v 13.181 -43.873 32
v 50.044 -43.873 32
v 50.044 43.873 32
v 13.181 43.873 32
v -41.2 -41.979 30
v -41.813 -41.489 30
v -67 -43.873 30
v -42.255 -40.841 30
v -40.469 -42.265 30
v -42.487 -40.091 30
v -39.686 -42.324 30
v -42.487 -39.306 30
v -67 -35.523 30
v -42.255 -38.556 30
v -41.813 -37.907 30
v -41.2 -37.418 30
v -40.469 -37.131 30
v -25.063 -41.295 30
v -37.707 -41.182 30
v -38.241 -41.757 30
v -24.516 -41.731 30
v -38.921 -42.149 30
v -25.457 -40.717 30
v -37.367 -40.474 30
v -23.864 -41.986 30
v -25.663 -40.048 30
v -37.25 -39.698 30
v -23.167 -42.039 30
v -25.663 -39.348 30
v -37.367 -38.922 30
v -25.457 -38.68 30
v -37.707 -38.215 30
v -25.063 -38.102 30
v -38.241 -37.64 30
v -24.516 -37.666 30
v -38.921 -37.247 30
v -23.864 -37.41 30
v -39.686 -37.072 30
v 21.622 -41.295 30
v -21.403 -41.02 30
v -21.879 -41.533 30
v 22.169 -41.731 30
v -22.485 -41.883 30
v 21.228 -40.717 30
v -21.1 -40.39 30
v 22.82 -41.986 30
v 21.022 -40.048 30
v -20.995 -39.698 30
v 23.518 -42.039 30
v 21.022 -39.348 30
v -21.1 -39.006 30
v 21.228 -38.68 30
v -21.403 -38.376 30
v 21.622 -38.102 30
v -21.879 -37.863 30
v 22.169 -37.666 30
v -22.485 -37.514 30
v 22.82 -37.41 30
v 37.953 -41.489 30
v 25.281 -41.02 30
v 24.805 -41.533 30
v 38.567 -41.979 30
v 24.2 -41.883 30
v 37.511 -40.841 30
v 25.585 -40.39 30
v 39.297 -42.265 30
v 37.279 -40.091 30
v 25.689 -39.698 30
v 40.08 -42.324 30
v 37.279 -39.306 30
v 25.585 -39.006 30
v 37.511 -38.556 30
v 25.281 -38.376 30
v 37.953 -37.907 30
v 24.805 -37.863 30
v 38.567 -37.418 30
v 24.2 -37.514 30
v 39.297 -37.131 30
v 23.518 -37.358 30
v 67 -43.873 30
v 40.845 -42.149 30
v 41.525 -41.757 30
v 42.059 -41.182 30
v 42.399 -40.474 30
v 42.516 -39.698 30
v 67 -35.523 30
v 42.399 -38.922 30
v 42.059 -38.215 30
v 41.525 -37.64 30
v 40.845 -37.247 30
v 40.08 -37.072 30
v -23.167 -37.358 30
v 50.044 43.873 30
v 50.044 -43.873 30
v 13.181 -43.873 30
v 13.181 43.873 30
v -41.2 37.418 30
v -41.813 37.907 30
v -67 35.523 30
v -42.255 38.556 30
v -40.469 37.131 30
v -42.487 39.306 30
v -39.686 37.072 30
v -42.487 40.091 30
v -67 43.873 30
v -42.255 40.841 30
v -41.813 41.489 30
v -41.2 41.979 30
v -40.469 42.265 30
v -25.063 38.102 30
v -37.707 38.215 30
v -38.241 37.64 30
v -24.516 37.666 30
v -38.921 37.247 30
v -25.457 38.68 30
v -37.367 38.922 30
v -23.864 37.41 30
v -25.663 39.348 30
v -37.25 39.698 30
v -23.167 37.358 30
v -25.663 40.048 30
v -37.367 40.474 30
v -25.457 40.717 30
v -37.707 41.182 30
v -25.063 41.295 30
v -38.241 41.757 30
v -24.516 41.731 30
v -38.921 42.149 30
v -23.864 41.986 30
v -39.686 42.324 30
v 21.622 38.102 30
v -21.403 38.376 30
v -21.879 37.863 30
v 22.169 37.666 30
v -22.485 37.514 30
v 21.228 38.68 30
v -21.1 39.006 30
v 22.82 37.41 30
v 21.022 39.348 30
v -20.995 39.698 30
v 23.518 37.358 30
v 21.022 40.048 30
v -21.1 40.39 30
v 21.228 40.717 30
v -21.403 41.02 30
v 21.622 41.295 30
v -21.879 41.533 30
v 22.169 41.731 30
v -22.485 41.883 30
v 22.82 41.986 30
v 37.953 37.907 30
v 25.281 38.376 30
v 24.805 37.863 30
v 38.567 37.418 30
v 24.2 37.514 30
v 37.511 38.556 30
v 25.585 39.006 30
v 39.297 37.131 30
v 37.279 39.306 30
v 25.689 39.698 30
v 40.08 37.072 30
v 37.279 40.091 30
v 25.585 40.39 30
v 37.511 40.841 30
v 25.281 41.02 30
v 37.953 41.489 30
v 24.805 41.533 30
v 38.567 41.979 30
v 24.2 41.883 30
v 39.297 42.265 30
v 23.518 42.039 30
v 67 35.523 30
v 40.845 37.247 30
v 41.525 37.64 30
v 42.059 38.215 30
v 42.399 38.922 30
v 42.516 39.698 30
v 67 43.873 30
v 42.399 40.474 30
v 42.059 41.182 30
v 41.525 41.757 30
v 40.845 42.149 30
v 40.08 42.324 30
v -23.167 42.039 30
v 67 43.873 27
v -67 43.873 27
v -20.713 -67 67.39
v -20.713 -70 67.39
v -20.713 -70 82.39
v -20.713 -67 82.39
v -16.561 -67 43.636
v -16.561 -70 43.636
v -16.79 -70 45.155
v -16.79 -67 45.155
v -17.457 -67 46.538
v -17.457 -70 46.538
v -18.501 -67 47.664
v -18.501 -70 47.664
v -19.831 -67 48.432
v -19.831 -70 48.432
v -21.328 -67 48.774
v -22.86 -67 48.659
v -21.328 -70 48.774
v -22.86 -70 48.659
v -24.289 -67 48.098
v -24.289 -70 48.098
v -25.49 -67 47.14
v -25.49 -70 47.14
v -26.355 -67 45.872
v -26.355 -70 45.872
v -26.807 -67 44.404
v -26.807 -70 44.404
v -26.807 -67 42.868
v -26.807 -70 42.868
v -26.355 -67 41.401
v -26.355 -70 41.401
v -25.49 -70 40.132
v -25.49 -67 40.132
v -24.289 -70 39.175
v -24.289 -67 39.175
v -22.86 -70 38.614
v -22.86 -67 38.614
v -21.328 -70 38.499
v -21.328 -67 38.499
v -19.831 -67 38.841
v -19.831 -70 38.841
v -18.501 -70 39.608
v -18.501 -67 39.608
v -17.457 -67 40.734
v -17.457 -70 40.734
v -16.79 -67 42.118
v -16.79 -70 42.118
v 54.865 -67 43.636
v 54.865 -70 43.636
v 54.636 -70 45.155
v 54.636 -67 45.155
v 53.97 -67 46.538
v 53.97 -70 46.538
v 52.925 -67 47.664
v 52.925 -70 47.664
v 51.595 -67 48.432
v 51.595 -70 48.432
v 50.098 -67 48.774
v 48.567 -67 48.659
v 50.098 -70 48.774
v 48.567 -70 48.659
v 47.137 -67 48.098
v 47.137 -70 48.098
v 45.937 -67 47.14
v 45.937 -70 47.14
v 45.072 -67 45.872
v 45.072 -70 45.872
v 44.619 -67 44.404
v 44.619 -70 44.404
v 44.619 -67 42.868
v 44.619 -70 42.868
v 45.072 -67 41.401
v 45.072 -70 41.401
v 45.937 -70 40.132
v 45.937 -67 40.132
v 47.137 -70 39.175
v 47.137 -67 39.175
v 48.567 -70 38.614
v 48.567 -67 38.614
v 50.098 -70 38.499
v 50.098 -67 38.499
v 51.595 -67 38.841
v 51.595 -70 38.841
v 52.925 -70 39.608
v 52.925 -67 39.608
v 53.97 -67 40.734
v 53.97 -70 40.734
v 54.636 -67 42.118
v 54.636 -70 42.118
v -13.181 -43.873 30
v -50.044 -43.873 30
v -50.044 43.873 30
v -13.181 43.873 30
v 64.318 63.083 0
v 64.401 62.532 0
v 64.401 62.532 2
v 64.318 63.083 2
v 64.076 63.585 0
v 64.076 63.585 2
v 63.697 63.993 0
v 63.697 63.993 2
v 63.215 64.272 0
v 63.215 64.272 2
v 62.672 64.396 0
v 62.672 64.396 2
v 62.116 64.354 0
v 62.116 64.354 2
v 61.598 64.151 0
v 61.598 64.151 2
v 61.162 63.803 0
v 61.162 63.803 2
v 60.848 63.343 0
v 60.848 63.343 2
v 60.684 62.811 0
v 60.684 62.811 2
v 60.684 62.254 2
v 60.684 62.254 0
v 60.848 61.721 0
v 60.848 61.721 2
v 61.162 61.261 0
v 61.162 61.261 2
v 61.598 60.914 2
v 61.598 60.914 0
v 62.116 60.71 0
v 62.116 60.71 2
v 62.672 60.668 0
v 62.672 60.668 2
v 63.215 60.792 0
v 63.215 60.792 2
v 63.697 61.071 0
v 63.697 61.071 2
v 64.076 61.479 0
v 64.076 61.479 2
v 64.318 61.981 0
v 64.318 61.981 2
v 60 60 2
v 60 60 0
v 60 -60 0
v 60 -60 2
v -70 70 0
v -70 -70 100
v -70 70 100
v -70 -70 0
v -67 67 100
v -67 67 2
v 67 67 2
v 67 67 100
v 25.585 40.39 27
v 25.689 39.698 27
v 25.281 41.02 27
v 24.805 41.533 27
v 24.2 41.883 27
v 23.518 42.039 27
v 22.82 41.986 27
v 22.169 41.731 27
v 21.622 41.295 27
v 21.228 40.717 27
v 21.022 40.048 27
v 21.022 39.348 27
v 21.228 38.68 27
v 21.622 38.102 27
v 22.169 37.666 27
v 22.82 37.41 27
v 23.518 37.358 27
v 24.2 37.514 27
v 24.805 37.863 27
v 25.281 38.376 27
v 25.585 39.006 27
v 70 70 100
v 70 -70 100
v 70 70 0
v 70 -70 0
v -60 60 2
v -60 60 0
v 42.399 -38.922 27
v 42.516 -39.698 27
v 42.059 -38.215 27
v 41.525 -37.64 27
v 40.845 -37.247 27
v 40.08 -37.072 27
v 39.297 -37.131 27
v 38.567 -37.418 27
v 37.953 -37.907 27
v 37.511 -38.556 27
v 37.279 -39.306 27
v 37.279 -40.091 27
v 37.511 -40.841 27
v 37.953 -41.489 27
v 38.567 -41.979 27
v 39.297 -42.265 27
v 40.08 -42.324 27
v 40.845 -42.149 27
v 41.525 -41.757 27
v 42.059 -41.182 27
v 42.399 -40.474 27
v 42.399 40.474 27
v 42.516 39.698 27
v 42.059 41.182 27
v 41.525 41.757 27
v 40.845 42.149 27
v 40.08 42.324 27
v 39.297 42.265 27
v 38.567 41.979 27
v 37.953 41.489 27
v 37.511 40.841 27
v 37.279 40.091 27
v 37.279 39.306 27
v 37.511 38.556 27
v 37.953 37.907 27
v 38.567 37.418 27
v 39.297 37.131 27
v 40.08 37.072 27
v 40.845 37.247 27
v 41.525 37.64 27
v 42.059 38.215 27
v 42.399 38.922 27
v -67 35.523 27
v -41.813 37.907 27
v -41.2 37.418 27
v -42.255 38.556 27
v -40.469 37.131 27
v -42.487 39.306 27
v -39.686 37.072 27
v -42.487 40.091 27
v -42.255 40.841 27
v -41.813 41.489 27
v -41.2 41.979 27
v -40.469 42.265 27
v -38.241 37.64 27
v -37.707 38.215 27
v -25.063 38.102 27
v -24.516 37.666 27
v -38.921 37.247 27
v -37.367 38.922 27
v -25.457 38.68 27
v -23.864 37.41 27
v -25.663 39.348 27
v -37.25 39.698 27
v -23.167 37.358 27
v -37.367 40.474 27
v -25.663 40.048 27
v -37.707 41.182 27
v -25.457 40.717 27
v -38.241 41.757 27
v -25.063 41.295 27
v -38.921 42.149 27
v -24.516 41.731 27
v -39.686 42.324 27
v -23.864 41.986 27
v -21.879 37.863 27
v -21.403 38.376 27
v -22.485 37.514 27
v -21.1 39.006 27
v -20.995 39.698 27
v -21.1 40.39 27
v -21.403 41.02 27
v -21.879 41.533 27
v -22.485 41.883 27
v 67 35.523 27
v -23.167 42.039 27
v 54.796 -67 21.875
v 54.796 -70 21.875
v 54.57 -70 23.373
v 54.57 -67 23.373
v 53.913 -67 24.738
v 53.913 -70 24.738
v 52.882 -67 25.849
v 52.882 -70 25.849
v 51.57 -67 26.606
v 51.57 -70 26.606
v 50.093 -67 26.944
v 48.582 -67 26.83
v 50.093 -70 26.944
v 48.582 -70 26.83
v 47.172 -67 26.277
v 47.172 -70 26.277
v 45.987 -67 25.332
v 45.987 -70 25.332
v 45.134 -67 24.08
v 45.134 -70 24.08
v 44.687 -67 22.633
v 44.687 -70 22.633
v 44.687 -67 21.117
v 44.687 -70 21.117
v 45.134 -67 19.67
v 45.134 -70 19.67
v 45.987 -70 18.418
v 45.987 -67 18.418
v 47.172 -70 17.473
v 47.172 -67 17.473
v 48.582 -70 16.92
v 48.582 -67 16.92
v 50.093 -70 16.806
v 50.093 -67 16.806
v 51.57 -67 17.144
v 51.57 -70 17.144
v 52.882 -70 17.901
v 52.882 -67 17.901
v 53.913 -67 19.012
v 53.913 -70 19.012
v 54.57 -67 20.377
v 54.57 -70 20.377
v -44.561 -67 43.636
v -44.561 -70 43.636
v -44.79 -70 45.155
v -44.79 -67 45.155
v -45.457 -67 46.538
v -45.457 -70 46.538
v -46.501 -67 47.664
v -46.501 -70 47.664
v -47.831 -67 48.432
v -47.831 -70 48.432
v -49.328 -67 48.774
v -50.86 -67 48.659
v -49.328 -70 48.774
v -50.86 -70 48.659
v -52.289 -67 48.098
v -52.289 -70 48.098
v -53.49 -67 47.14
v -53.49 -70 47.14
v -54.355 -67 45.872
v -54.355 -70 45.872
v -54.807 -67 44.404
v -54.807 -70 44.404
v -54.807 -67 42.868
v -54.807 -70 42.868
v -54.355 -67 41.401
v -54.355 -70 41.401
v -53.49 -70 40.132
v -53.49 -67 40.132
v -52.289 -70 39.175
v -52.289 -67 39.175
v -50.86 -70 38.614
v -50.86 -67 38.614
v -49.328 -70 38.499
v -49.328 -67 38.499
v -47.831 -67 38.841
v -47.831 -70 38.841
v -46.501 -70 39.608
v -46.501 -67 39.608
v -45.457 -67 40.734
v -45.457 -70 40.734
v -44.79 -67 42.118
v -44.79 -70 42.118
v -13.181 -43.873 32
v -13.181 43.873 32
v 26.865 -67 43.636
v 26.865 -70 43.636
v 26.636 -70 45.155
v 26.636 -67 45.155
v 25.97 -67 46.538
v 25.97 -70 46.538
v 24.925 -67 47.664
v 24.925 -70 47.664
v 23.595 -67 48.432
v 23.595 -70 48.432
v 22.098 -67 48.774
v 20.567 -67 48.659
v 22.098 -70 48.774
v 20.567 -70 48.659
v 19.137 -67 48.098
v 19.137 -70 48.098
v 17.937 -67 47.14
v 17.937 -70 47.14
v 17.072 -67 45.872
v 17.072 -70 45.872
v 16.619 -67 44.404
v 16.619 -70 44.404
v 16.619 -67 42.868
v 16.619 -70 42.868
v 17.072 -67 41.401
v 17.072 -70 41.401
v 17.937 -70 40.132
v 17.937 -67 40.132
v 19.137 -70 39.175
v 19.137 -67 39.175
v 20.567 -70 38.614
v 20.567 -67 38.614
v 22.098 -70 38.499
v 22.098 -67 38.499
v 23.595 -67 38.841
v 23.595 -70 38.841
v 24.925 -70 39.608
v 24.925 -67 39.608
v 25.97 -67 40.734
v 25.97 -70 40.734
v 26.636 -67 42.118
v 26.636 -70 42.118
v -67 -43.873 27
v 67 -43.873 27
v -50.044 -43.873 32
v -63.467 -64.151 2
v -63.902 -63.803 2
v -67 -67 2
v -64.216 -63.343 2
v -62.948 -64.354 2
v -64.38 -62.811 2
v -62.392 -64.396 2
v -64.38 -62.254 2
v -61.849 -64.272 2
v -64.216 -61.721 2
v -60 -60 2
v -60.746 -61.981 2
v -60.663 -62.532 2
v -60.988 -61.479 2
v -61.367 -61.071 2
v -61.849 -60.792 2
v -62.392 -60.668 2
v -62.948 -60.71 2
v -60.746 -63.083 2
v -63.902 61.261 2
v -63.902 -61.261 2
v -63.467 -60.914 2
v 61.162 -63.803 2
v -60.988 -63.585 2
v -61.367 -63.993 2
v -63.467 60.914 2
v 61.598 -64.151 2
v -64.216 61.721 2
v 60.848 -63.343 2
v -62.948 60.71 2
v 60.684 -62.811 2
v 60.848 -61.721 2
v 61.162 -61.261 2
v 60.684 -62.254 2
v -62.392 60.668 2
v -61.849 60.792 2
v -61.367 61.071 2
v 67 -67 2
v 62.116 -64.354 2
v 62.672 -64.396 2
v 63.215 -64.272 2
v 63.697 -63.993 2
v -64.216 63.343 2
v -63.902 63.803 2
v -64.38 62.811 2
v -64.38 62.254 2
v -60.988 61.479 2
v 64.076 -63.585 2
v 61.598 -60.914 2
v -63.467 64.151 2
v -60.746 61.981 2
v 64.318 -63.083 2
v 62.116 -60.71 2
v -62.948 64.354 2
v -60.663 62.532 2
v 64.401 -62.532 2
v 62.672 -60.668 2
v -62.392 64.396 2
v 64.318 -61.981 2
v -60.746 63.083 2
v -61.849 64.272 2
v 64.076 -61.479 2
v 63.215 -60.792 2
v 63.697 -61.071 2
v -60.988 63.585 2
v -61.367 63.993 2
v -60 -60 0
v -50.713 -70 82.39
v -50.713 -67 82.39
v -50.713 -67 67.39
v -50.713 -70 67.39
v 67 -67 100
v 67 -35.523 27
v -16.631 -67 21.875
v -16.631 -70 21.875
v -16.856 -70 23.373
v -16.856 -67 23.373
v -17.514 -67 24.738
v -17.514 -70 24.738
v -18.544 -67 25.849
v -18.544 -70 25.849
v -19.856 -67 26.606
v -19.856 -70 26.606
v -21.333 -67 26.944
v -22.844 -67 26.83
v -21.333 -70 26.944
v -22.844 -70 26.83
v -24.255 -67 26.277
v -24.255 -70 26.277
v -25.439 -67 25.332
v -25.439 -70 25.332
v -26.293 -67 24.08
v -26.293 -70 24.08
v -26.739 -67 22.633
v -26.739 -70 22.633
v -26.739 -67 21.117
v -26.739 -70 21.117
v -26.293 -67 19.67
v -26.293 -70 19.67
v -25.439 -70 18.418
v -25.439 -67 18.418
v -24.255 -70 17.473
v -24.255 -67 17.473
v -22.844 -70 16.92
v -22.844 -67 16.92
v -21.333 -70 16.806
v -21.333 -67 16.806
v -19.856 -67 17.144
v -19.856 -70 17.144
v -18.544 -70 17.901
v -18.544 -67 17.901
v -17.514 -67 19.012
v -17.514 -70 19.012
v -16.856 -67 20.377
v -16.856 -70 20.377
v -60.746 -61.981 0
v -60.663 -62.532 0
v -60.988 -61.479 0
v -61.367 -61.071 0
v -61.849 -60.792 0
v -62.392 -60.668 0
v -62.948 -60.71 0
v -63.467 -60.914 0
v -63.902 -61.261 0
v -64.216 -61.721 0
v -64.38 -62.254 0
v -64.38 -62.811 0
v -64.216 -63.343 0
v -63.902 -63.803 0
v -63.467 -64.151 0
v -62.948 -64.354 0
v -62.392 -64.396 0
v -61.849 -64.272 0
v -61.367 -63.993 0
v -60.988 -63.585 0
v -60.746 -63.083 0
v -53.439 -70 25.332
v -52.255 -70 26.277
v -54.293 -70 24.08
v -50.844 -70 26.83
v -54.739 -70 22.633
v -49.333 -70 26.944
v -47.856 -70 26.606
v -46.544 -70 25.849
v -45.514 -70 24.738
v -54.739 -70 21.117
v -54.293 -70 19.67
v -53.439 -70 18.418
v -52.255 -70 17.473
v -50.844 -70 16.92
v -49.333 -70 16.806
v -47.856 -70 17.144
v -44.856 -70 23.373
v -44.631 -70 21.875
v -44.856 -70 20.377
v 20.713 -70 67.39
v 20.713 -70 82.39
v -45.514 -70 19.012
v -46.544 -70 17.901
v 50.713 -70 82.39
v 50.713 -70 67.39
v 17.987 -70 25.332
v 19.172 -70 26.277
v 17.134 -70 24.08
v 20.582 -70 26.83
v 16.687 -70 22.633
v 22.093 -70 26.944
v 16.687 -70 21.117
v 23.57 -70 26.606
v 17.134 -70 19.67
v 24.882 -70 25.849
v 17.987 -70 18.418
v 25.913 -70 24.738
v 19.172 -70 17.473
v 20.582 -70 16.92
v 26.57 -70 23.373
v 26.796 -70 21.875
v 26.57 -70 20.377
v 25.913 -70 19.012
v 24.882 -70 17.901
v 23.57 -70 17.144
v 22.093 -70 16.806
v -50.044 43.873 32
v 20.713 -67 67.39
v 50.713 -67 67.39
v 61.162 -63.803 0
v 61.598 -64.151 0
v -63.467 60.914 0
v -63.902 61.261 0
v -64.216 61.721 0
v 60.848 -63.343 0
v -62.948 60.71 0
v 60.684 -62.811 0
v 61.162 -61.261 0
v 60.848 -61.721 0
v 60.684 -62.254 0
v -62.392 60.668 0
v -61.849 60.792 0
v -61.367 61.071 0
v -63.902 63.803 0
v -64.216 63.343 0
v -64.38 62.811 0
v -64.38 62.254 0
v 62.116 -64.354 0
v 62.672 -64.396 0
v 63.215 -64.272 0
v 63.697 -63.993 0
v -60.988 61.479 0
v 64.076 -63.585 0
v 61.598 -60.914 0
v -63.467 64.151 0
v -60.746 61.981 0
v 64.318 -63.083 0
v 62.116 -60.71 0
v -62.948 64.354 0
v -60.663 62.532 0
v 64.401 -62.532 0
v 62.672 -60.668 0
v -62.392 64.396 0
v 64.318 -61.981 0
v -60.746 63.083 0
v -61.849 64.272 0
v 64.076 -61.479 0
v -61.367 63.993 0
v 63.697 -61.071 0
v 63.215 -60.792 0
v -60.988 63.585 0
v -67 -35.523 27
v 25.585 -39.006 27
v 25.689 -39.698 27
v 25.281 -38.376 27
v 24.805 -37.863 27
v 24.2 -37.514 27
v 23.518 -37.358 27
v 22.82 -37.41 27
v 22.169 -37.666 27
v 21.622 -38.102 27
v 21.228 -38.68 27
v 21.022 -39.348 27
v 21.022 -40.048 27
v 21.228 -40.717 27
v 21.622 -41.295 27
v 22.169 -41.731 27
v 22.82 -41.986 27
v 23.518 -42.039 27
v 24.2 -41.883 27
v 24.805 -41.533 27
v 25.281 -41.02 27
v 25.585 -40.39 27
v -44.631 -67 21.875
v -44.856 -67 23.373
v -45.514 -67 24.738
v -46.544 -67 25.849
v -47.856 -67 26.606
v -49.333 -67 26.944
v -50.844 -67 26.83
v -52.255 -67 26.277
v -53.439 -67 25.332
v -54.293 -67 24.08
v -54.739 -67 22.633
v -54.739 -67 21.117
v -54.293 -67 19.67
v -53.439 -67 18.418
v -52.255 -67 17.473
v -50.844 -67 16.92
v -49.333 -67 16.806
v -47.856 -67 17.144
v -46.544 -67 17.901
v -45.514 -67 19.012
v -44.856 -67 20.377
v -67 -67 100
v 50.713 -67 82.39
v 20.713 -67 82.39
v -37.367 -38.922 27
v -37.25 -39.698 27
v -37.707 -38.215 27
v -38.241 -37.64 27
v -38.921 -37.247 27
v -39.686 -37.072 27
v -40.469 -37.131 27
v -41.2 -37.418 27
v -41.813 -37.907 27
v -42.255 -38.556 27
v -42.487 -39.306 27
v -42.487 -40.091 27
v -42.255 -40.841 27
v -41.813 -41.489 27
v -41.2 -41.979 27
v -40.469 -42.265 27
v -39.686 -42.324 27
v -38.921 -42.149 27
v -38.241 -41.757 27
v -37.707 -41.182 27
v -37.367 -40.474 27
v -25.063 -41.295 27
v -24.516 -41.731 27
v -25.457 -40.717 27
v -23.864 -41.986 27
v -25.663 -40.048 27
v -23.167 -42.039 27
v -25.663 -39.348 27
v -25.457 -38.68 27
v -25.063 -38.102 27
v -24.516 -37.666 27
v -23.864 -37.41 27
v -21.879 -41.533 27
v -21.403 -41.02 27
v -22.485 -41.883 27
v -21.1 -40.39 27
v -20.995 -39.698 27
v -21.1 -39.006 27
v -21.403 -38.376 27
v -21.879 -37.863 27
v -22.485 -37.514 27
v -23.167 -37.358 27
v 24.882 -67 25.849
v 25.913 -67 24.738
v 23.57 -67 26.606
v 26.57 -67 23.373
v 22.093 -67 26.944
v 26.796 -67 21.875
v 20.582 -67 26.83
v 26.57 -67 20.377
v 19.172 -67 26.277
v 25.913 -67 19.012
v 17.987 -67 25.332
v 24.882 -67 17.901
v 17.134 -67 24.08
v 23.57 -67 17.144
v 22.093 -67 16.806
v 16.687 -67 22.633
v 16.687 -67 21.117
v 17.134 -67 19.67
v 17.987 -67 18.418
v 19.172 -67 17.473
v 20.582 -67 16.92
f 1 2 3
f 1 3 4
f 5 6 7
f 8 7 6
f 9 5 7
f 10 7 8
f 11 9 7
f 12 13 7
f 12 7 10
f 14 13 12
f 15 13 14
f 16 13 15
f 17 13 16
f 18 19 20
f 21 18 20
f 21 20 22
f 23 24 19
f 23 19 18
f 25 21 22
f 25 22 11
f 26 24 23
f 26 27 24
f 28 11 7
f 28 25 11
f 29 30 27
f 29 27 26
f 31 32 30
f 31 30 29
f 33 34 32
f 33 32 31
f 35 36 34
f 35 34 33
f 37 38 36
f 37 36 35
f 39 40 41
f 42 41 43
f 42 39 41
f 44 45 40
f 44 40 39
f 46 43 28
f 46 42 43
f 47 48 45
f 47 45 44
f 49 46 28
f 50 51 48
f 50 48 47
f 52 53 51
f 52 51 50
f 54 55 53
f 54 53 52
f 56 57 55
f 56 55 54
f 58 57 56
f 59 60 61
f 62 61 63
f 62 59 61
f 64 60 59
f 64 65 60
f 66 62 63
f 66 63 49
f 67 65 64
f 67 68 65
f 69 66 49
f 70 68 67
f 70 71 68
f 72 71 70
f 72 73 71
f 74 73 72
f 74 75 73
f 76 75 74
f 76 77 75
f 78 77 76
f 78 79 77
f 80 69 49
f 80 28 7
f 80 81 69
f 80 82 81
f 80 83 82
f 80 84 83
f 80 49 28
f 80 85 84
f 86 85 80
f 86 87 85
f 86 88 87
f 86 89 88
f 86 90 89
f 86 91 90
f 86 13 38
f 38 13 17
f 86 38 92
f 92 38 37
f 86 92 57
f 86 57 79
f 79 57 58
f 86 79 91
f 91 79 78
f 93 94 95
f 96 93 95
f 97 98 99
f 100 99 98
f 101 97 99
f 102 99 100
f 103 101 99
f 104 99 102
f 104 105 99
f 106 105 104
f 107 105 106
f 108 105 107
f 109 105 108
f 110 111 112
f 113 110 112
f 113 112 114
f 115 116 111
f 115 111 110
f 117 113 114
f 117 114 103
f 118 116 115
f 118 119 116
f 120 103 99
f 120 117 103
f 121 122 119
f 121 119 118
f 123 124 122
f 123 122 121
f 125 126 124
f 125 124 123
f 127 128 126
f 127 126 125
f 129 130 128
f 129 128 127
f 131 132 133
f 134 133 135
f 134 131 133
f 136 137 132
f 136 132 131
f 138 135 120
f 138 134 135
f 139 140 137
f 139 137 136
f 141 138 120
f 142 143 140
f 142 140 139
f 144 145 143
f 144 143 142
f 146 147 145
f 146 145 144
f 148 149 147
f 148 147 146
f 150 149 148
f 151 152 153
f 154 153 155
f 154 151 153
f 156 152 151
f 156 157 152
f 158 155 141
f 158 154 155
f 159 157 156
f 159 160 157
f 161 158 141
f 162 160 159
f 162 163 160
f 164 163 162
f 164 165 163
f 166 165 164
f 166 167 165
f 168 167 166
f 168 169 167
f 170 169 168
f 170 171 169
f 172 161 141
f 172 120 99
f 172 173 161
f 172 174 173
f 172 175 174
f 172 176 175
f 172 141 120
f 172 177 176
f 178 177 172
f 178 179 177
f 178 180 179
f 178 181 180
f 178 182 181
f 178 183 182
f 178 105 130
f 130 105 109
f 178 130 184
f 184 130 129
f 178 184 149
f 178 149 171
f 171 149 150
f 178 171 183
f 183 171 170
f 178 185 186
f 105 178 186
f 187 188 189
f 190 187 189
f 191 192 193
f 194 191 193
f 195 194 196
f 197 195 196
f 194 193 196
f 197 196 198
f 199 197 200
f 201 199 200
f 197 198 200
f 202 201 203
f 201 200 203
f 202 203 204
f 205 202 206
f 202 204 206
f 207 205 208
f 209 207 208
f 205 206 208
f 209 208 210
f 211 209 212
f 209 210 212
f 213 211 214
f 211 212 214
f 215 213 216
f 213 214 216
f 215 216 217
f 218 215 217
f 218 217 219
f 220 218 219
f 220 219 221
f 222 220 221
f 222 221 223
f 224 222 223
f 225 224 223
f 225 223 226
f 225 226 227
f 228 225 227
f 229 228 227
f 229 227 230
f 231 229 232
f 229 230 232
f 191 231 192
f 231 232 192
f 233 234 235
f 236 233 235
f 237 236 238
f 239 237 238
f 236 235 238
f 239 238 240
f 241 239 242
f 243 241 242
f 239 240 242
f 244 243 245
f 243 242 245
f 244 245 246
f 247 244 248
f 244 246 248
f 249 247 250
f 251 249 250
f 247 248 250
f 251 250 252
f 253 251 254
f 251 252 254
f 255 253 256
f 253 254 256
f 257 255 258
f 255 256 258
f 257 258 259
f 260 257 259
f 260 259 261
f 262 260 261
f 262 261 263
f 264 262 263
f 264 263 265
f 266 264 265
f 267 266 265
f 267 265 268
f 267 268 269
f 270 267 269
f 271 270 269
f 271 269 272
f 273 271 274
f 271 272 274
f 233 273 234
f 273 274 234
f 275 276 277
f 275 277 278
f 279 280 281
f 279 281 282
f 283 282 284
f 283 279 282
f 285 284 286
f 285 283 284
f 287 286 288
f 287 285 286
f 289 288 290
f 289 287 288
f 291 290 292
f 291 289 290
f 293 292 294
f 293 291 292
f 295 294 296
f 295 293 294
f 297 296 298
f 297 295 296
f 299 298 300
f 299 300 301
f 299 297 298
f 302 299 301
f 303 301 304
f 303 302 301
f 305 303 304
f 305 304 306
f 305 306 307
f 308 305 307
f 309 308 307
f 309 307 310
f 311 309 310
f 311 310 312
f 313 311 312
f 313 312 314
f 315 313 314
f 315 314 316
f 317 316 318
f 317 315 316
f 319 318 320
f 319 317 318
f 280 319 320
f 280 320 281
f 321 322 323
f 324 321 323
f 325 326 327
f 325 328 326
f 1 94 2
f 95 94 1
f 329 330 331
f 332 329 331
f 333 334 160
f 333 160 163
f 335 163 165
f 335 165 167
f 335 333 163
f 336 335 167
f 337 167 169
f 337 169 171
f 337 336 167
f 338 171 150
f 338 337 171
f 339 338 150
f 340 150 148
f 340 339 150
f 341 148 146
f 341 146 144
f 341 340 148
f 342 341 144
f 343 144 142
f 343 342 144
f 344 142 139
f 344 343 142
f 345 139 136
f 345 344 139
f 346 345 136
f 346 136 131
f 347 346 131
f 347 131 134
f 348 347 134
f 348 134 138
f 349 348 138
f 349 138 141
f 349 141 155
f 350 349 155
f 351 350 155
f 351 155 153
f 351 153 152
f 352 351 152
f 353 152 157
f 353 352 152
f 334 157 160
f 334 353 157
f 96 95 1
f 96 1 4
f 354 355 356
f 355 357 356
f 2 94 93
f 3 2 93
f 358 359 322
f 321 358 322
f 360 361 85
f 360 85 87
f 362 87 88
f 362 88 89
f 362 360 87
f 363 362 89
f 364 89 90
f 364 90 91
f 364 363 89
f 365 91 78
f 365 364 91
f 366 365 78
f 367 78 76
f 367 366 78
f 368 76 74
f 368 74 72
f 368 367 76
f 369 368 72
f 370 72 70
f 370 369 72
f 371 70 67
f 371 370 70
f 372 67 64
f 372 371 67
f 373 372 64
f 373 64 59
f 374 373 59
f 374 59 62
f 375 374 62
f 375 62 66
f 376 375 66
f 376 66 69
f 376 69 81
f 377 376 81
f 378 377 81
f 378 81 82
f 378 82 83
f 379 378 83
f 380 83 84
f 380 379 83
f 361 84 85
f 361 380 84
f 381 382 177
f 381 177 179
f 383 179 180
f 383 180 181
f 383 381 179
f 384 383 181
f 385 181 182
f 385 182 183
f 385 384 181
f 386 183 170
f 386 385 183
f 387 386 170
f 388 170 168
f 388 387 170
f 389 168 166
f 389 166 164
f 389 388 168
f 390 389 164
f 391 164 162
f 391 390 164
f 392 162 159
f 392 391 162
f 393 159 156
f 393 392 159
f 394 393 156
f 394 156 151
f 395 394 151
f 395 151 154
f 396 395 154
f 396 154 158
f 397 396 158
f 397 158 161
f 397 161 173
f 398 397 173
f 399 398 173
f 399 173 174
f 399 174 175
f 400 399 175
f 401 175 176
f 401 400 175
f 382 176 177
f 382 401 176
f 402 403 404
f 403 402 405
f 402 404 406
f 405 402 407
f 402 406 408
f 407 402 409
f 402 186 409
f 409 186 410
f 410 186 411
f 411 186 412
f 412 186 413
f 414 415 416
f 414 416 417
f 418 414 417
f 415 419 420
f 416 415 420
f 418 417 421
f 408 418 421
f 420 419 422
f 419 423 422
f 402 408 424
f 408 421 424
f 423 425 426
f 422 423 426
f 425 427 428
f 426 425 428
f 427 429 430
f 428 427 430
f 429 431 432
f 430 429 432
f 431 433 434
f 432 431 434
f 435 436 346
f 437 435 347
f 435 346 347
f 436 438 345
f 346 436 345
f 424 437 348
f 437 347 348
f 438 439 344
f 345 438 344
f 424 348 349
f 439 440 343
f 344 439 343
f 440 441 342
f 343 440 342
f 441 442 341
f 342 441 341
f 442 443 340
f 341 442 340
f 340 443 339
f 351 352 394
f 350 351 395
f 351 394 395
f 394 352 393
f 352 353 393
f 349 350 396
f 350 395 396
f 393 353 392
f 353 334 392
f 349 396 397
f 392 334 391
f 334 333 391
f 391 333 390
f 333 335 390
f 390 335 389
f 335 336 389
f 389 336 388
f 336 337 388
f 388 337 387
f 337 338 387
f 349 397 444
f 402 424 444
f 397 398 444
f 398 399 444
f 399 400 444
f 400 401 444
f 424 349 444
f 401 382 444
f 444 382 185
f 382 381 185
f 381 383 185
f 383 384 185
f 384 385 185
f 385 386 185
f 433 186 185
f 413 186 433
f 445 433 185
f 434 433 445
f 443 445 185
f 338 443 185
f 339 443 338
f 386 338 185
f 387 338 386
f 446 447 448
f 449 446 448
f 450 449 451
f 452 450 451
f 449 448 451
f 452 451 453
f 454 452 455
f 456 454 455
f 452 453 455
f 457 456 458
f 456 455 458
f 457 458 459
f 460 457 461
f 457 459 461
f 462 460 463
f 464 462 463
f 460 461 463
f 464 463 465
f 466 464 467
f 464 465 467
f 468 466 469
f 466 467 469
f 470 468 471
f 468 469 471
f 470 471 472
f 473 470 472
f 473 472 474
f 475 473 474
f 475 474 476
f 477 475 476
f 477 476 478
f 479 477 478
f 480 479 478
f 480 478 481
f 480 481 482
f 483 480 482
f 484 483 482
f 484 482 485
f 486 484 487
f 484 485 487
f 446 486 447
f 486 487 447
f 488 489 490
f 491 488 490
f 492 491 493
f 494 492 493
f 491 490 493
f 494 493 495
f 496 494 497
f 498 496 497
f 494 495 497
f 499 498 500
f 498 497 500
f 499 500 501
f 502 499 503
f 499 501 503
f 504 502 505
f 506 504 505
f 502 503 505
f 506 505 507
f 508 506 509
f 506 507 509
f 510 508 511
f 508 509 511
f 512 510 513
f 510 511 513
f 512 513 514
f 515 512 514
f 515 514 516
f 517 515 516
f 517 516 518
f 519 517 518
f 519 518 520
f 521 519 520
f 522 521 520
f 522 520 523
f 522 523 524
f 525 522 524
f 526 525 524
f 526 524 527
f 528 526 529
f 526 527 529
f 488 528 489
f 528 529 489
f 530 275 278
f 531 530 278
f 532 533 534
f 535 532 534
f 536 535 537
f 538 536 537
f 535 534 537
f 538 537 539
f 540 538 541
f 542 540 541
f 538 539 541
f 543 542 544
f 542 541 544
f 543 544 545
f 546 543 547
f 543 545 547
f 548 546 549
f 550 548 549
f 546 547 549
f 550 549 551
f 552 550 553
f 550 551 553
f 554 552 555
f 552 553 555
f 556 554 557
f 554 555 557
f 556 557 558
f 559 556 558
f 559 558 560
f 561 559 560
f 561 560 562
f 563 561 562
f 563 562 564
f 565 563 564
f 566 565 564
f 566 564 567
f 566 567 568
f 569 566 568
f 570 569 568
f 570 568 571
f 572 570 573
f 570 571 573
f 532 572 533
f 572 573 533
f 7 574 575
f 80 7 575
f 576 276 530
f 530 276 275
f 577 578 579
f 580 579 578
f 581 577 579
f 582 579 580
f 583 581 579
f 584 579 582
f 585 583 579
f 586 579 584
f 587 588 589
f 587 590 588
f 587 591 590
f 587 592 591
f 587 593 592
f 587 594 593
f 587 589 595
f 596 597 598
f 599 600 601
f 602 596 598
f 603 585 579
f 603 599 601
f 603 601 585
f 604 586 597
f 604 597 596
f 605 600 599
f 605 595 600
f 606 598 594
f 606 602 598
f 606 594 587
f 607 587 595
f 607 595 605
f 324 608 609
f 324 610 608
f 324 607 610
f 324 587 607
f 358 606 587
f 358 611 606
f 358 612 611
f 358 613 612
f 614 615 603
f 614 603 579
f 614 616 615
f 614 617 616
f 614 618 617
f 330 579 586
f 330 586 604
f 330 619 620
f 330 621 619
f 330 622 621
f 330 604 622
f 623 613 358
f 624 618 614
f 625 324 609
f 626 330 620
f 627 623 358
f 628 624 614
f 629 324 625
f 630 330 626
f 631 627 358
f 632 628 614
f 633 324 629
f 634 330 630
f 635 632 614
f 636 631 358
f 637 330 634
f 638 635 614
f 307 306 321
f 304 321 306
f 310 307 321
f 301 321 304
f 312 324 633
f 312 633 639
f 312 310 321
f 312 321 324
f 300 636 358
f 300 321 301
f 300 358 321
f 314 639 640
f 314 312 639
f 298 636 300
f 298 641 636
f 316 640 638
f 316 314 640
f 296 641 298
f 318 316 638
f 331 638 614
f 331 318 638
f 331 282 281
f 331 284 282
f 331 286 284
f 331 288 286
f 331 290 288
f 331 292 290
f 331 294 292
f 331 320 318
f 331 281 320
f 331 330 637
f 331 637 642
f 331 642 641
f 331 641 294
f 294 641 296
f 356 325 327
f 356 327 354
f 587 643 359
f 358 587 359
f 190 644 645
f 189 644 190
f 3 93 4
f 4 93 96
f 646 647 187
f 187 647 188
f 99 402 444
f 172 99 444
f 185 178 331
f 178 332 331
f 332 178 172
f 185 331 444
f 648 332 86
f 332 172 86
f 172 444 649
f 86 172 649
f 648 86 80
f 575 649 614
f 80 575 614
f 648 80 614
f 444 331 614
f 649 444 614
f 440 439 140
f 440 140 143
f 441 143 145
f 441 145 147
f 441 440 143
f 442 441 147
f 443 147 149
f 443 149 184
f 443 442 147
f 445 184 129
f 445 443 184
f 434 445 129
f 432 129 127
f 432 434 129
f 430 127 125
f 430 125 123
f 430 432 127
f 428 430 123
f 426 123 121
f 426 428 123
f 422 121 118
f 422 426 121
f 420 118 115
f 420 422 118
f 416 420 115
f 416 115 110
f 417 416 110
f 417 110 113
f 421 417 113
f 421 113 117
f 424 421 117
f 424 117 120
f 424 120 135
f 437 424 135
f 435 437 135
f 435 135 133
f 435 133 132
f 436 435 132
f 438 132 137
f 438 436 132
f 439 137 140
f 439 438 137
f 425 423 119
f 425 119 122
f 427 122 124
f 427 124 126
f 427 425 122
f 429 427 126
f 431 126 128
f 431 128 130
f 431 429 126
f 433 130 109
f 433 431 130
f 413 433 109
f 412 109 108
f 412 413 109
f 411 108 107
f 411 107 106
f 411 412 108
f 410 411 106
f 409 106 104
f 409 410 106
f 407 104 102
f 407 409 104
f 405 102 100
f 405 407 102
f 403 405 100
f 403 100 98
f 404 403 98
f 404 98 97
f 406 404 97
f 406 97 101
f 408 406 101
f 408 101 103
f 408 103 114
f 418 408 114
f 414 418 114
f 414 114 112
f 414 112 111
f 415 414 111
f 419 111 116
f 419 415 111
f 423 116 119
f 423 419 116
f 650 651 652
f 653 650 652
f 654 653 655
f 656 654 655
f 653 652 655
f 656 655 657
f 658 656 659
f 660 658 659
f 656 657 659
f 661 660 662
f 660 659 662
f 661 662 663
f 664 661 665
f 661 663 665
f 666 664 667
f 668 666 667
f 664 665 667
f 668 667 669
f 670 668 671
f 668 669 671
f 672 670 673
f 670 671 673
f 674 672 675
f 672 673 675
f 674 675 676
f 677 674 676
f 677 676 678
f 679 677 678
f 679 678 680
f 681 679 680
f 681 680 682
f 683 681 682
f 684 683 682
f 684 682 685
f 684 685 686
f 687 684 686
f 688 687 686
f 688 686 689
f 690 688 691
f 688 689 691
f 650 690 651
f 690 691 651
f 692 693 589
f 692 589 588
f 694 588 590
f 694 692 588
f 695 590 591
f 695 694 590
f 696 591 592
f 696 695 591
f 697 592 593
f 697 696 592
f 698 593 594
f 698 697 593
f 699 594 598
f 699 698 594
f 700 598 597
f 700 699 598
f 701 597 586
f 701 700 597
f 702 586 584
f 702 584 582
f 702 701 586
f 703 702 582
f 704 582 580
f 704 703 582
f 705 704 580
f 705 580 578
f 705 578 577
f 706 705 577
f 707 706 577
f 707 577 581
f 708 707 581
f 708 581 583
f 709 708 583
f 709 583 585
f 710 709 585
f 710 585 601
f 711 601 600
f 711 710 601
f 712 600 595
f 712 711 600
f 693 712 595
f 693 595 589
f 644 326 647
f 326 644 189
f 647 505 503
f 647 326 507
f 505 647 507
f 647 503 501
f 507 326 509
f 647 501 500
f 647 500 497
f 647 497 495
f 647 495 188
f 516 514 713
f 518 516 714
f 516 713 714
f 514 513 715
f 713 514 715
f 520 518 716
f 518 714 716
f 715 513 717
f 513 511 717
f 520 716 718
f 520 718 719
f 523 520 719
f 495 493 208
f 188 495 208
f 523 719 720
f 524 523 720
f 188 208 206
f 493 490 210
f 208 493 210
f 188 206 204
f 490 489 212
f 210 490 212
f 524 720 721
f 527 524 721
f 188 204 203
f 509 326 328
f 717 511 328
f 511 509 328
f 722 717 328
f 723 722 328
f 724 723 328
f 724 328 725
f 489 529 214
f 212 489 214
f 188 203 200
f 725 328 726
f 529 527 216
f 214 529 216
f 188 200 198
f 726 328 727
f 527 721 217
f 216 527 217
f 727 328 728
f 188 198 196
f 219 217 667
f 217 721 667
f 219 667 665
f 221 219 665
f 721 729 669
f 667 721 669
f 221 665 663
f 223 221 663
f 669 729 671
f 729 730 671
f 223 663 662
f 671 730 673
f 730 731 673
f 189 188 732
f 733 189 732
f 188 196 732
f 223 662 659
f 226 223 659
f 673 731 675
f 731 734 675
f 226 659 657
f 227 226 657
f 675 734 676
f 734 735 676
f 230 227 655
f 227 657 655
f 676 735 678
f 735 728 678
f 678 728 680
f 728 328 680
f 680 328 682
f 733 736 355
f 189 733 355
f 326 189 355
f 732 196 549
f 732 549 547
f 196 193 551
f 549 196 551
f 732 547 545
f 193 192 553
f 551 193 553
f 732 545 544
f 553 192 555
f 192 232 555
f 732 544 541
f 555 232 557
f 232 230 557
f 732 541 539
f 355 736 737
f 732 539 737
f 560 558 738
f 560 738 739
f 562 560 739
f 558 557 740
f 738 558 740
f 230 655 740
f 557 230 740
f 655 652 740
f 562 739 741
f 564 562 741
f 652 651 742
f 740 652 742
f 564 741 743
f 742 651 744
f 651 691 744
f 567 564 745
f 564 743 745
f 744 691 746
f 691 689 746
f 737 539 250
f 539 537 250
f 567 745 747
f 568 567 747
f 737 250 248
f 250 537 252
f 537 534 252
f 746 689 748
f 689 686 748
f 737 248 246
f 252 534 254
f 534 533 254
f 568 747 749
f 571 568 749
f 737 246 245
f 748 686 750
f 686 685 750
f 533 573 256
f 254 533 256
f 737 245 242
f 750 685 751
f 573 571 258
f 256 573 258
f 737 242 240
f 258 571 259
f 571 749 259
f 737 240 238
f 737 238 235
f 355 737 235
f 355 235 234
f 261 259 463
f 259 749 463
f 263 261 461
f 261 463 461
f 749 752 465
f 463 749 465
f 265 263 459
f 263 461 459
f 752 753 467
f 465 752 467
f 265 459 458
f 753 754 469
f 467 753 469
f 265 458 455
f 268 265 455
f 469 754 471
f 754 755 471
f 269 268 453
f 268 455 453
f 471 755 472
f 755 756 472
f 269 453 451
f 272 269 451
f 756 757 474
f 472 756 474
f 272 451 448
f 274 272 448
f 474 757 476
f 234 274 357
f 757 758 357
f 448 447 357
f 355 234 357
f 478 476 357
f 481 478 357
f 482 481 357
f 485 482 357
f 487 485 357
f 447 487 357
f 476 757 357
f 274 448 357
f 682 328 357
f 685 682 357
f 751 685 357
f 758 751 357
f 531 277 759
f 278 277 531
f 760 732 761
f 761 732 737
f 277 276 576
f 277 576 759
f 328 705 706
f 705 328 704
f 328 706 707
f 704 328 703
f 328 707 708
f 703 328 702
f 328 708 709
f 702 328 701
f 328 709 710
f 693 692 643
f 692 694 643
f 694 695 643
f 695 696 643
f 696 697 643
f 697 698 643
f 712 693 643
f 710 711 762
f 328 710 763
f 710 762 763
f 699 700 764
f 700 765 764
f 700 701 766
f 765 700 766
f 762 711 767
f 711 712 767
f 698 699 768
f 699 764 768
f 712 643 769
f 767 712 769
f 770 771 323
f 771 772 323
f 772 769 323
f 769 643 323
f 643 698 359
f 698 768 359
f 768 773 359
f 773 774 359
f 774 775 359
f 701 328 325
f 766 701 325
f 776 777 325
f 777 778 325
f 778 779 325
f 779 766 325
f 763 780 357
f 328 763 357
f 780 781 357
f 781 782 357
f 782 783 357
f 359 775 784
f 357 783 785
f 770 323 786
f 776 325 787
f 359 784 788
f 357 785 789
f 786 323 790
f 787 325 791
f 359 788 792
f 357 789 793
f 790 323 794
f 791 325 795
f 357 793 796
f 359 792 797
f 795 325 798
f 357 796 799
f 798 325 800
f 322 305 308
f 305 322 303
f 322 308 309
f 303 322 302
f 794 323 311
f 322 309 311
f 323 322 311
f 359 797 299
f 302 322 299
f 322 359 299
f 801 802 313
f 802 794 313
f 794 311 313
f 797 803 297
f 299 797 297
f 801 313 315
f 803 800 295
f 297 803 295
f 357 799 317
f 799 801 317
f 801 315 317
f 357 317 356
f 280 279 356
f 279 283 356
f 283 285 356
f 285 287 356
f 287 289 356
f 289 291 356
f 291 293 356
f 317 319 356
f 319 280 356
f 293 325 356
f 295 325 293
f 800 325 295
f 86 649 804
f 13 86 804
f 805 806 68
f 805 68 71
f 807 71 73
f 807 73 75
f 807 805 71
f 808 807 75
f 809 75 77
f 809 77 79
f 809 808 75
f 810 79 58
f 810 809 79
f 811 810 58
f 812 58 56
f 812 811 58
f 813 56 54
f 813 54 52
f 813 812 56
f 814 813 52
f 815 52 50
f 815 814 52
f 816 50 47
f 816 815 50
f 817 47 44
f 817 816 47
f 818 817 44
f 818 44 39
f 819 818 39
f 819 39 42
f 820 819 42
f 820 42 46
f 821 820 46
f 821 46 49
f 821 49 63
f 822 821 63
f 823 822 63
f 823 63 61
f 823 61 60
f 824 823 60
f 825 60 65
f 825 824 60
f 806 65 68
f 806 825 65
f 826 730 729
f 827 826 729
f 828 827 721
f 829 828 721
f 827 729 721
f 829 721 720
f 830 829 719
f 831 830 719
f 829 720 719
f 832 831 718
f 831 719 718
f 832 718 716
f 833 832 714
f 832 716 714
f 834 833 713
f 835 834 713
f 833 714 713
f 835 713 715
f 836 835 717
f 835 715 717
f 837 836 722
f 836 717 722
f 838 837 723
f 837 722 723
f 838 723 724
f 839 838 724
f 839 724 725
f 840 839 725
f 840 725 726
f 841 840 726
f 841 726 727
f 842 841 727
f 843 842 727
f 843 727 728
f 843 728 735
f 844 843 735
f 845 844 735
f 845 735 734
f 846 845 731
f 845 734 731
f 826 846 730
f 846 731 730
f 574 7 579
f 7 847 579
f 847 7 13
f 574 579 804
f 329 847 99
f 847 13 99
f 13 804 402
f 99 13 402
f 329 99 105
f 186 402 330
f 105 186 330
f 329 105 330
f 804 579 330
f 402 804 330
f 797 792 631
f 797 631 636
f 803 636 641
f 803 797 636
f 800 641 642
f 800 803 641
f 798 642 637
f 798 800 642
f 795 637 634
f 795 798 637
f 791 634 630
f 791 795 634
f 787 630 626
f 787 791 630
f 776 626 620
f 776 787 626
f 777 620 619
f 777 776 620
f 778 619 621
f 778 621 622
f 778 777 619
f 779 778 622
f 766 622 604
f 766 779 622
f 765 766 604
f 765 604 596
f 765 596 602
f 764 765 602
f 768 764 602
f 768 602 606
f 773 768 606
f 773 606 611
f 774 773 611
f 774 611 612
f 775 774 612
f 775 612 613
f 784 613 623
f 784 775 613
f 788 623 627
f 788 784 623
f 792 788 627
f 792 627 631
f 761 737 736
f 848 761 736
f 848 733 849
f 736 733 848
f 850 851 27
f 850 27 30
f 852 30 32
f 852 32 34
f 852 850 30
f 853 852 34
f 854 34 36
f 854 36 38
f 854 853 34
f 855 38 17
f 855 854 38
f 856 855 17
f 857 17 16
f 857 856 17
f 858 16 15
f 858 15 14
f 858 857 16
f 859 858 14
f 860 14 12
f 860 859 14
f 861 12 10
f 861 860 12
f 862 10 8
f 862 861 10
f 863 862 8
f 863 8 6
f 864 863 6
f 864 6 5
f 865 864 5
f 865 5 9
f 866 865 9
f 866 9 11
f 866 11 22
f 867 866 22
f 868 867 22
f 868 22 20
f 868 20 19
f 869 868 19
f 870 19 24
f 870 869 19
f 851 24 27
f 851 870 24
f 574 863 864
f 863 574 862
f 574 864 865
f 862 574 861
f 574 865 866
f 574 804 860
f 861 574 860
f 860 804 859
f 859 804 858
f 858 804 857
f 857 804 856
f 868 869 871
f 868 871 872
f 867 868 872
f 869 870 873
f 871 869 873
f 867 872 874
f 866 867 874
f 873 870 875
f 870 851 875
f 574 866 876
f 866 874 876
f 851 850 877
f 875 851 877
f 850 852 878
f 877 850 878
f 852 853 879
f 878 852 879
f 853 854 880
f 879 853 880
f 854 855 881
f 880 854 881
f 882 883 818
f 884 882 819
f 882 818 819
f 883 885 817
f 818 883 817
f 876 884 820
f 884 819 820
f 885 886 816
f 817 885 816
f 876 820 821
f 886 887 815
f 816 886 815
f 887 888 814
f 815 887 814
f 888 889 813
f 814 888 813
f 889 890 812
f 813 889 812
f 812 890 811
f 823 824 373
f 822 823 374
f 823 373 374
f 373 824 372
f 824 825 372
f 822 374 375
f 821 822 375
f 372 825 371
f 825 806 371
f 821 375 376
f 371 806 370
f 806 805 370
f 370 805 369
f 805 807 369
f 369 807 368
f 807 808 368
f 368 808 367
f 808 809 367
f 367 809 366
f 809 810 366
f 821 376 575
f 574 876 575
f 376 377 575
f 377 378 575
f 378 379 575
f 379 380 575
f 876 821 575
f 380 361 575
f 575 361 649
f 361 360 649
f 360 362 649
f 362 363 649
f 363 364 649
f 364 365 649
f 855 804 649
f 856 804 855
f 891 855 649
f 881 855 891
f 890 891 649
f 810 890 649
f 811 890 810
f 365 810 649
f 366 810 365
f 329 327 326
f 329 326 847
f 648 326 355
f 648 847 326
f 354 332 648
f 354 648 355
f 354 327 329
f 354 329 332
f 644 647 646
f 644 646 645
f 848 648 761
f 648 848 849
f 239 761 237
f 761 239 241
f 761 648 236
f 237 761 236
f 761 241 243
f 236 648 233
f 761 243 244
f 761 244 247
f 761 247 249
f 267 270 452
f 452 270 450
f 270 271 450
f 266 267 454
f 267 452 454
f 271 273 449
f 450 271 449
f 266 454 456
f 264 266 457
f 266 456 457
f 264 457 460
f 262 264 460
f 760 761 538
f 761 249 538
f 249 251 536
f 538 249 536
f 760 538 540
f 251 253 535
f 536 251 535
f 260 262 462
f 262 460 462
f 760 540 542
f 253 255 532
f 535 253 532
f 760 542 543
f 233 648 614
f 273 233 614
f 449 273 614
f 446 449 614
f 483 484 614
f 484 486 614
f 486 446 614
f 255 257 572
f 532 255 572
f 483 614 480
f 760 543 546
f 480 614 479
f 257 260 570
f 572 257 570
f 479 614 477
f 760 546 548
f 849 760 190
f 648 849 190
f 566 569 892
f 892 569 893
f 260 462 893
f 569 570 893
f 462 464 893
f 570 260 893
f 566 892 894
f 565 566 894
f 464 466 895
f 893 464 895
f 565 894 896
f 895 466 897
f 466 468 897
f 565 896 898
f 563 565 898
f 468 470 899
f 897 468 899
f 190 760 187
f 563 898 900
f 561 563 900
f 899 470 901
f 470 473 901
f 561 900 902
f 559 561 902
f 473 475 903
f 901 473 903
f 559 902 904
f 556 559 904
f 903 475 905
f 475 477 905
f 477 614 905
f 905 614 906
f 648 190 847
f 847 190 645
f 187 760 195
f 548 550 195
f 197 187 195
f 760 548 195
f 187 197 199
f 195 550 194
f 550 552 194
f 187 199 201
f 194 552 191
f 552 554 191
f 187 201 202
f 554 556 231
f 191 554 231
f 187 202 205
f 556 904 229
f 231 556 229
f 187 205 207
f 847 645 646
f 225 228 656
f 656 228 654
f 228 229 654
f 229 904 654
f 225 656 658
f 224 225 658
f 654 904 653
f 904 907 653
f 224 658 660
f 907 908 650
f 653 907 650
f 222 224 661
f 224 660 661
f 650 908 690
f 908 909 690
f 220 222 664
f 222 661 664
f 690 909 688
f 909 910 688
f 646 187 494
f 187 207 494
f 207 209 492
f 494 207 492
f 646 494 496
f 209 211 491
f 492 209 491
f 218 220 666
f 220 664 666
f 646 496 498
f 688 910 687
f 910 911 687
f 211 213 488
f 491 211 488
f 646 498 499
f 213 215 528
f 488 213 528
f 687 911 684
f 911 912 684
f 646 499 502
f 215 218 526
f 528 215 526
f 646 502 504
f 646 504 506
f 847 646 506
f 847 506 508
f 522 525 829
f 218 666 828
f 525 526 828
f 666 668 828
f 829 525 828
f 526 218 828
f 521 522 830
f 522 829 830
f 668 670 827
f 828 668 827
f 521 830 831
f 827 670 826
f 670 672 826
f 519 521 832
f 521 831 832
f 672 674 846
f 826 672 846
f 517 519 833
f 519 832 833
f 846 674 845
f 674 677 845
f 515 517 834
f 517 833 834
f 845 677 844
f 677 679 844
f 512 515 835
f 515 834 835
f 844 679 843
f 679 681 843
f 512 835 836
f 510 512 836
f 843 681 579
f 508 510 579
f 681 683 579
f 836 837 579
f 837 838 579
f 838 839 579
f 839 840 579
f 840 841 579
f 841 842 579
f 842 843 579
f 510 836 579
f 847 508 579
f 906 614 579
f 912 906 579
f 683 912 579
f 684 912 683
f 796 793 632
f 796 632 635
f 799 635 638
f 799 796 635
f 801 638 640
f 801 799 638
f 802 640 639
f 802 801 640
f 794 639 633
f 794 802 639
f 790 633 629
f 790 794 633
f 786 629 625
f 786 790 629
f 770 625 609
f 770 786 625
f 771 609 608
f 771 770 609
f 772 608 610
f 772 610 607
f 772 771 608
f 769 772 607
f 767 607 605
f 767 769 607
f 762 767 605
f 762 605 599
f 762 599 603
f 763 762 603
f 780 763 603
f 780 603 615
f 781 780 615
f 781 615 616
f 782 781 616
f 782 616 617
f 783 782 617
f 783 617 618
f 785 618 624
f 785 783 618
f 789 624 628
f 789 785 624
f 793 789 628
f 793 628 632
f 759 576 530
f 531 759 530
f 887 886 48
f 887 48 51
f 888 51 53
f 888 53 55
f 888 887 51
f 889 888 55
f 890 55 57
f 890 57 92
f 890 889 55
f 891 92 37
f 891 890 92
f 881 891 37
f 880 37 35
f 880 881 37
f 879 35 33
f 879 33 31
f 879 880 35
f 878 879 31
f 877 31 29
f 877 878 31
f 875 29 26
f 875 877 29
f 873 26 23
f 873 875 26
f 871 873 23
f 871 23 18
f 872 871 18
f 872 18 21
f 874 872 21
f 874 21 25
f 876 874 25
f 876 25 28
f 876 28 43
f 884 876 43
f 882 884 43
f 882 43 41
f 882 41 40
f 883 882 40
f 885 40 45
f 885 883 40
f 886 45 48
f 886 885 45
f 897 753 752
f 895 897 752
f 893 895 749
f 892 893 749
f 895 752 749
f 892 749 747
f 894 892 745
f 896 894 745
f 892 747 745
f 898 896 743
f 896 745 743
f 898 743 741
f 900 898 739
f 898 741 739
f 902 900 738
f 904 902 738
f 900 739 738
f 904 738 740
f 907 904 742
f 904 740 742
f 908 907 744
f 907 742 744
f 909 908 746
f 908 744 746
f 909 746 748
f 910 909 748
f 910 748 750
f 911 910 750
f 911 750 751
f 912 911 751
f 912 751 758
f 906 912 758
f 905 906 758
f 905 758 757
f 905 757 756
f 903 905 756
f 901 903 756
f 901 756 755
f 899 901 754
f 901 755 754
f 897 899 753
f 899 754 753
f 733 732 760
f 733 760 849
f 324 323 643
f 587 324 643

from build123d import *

# Parameters (mm, degrees)
F0_W     = 140
F0_H     = 140
F0_R     = 1.8690060527
F0_W_2   = 7
F0_H_2   = 71.0464436561
F0_H_3   = 8.3500510082
F1_DEPTH = 2
F2_START = 2
F2_DEPTH = 98
F3_START = 27
F0_W_3   = 120
F0_R_2   = 2.6331216757
F0_R_3   = 2.3469079545
F3_DEPTH = 3
F4_W     = 30
F4_H     = 15
F4_R     = 5.151771656
F4_R_2   = 5.0827381366
F5_DEPTH = 3
F6_W     = 36.8634238839
F6_H     = 87.7465456724
F7_DEPTH = 2


with BuildPart() as f1:
    # F0 (on Top) → F1 (new body)
    with BuildSketch(Plane.XY):
        Rectangle(F0_W, F0_H)
        Polygon((67, 67), (67, 43.8732728362), (67, 35.523221828), (67, -35.523221828), (67, -43.8732728362), (67, -67), (-67, -67), (-67, -43.8732728362), (-67, -35.523221828), (-67, 35.523221828), (-67, 43.8732728362), (-67, 67), align=None, mode=Mode.SUBTRACT)
        Polygon((-60, 60), (60, 60), (60, 43.8732728362), (67, 43.8732728362), (67, 67), (-67, 67), (-67, 43.8732728362), (-60, 43.8732728362), align=None)
        with Locations((-62.5321604311, 62.5321604311)):
            Circle(F0_R, mode=Mode.SUBTRACT)
        with Locations((62.5321604311, 62.5321604311)):
            Circle(F0_R, mode=Mode.SUBTRACT)
        Polygon((67, -43.8732728362), (60, -43.8732728362), (60, -60), (-60, -60), (-60, -43.8732728362), (-67, -43.8732728362), (-67, -67), (67, -67), align=None)
        with Locations((-62.5321604311, -62.5321604311)):
            Circle(F0_R, mode=Mode.SUBTRACT)
        with Locations((62.5321604311, -62.5321604311)):
            Circle(F0_R, mode=Mode.SUBTRACT)
        with Locations((-63.5, 0)):
            Rectangle(F0_W_2, F0_H_2)
        with Locations((63.5, 0)):
            Rectangle(F0_W_2, F0_H_2)
        with Locations((-63.5, 39.6982473321)):
            Rectangle(F0_W_2, F0_H_3)
        with Locations((-63.5, -39.6982473321)):
            Rectangle(F0_W_2, F0_H_3)
        with Locations((63.5, -39.6982473321)):
            Rectangle(F0_W_2, F0_H_3)
        with Locations((63.5, 39.6982473321)):
            Rectangle(F0_W_2, F0_H_3)
    extrude(amount=F1_DEPTH)

    # F0 (on Top) → F2 (join)
    with BuildSketch(Plane.XY.offset(F2_START)):
        Rectangle(F0_W, F0_H)
        Polygon((67, 67), (67, 43.8732728362), (67, 35.523221828), (67, -35.523221828), (67, -43.8732728362), (67, -67), (-67, -67), (-67, -43.8732728362), (-67, -35.523221828), (-67, 35.523221828), (-67, 43.8732728362), (-67, 67), align=None, mode=Mode.SUBTRACT)
    extrude(amount=F2_DEPTH)

    # F0 (on Top) → F3 (join)
    with BuildSketch(Plane.XY.offset(F3_START)):
        with Locations((0, 39.6982473321)):
            Rectangle(F0_W_3, F0_H_3)
        with Locations((-39.8830659688, 39.6982473321)):
            Circle(F0_R_2, mode=Mode.SUBTRACT)
        with Locations((-23.3422257006, 39.6982473321)):
            Circle(F0_R_3, mode=Mode.SUBTRACT)
        with Locations((23.3422257006, 39.6982473321)):
            Circle(F0_R_3, mode=Mode.SUBTRACT)
        with Locations((39.8830659688, 39.6982473321)):
            Circle(F0_R_2, mode=Mode.SUBTRACT)
        with Locations((-63.5, 39.6982473321)):
            Rectangle(F0_W_2, F0_H_3)
        with Locations((63.5, 39.6982473321)):
            Rectangle(F0_W_2, F0_H_3)
        with Locations((63.5, -39.6982473321)):
            Rectangle(F0_W_2, F0_H_3)
        with Locations((0, -39.6982473321)):
            Rectangle(F0_W_3, F0_H_3)
        with Locations((-39.8830659688, -39.6982473321)):
            Circle(F0_R_2, mode=Mode.SUBTRACT)
        with Locations((-23.3422257006, -39.6982473321)):
            Circle(F0_R_3, mode=Mode.SUBTRACT)
        with Locations((23.3422257006, -39.6982473321)):
            Circle(F0_R_3, mode=Mode.SUBTRACT)
        with Locations((39.8830659688, -39.6982473321)):
            Circle(F0_R_2, mode=Mode.SUBTRACT)
        with Locations((-63.5, -39.6982473321)):
            Rectangle(F0_W_2, F0_H_3)
    extrude(amount=F3_DEPTH)

    # F4 (on face) → F5 (cut, through all)
    with BuildSketch(Plane.XZ.offset(70)):
        with Locations((-35.7132482901, 74.8899433017)):
            Rectangle(F4_W, F4_H)
        with Locations((35.7132482901, 74.8899433017)):
            Rectangle(F4_W, F4_H)
        with Locations((49.7132482901, 43.6362959445)):
            Circle(F4_R)
        with Locations((21.7132482901, 43.6362959445)):
            Circle(F4_R)
        with Locations((21.7132482901, 21.8749996275)):
            Circle(F4_R_2)
        with Locations((49.7132482901, 21.8749996275)):
            Circle(F4_R_2)
        with Locations((-21.7132482901, 43.6362959445)):
            Circle(F4_R)
        with Locations((-49.7132482901, 43.6362959445)):
            Circle(F4_R)
        with Locations((-49.7132482901, 21.8749996275)):
            Circle(F4_R_2)
        with Locations((-21.7132482901, 21.8749996275)):
            Circle(F4_R_2)
    extrude(amount=-F5_DEPTH, mode=Mode.SUBTRACT)


with BuildPart() as f7:
    # F6 (on face) → F7 (new body)
    with BuildSketch(Plane.XY.offset(30)):
        with Locations((-31.6126458347, 0)):
            Rectangle(F6_W, F6_H)
    extrude(amount=F7_DEPTH)


with BuildPart() as f8_1:
    # F8: instance of F7
    add(f7.part.mirror(Plane.YZ))


solid = Compound([f1.part, f7.part, f8_1.part])
